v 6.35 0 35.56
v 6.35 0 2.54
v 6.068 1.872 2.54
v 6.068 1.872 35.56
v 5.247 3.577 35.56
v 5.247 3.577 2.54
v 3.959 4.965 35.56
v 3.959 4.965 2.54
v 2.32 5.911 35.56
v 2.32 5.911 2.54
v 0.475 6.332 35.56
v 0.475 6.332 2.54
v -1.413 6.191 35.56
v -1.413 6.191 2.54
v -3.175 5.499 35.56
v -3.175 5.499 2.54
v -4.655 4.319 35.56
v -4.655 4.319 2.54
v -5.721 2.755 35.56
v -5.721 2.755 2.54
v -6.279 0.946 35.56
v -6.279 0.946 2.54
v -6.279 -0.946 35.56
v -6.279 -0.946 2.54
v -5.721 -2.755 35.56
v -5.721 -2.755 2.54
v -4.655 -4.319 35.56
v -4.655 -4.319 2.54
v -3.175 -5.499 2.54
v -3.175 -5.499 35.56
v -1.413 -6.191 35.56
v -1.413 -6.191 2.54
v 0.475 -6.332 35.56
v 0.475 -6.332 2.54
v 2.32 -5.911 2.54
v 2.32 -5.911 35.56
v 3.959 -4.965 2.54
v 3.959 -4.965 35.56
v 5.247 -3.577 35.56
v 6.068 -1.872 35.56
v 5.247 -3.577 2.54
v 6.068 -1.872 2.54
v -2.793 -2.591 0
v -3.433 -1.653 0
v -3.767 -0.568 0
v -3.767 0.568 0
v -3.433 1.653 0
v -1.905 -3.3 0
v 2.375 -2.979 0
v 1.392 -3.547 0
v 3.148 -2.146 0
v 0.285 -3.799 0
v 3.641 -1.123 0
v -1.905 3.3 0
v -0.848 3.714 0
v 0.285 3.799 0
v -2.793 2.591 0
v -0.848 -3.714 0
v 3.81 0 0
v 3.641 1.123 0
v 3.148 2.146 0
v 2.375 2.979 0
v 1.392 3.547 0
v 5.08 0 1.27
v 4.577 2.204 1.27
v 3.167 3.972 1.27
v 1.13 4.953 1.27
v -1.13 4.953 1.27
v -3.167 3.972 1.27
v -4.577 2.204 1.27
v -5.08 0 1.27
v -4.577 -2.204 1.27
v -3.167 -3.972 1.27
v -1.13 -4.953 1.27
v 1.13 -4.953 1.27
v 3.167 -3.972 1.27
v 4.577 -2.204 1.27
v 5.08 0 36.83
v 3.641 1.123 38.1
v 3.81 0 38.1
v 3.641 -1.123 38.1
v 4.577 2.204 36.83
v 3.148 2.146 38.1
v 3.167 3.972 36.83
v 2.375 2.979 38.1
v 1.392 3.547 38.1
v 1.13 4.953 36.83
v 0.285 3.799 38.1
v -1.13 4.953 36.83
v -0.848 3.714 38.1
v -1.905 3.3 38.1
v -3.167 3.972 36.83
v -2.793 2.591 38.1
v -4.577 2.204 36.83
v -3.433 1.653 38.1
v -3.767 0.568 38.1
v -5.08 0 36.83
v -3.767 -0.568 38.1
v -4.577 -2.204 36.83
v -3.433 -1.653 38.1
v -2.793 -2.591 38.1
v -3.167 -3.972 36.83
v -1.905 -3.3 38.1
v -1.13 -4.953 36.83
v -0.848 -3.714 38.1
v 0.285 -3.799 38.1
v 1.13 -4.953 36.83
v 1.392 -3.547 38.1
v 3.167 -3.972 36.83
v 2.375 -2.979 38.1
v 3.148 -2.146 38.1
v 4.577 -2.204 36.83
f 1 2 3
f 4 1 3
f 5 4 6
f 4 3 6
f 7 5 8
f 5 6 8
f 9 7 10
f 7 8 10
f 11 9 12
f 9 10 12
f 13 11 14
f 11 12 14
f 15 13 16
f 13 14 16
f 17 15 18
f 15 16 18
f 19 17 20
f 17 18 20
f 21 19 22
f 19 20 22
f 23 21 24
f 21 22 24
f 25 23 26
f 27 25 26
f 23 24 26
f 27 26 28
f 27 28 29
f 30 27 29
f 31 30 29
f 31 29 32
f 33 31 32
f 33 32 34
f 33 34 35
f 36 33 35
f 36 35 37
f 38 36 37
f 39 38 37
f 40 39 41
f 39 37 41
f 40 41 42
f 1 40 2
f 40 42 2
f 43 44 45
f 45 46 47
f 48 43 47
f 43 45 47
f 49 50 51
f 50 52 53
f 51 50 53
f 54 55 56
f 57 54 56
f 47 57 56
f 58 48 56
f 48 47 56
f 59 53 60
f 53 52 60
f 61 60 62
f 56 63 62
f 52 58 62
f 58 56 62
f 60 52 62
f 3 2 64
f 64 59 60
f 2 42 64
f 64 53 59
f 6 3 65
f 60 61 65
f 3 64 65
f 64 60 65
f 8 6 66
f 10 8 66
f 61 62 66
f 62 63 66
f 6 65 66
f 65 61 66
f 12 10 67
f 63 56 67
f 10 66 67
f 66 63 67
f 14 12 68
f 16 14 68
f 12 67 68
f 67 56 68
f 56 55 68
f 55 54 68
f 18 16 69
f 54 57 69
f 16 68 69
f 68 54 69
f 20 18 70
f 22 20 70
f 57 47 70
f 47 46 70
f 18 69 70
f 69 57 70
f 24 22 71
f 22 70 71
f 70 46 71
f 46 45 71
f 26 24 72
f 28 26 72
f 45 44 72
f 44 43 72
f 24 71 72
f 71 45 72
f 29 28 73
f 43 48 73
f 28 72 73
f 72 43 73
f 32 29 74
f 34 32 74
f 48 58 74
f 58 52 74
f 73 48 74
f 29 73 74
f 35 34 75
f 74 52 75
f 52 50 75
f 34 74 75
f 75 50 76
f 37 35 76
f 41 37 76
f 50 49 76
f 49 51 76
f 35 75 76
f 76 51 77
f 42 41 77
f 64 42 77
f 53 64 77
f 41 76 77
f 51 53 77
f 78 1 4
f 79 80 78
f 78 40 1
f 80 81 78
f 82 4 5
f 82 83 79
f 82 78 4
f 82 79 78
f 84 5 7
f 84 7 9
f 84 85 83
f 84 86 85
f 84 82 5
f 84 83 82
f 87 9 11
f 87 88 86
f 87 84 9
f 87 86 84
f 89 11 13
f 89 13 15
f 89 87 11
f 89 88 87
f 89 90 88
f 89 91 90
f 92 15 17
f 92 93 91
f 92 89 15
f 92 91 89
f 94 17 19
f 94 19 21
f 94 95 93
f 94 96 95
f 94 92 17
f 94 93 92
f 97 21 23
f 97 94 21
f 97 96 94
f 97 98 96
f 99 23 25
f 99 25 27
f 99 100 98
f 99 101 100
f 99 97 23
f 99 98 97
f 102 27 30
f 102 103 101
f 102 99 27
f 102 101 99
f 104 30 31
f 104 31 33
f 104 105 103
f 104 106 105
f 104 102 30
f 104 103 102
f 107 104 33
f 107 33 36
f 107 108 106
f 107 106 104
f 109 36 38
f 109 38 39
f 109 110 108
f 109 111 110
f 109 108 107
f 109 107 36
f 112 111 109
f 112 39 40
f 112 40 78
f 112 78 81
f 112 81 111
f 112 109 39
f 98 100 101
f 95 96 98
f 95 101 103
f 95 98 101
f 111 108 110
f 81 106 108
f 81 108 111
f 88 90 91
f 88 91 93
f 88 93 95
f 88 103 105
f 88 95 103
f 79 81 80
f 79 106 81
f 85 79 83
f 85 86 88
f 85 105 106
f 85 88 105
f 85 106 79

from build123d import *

# Parameters (mm, degrees)
SKETCH1_R           = 6.35
BOSS_EXTRUDE1_DEPTH = 38.1
CHAMFER1_SIZE       = 2.54
CHAMFER2_SIZE       = 2.54


with BuildPart() as part:
    # Sketch1 → Boss-Extrude1 (new body)
    with BuildSketch(Plane.XY):
        Circle(SKETCH1_R)
    extrude(amount=BOSS_EXTRUDE1_DEPTH)

    # Chamfer1
    chamfer1_edges = [part.edges().sort_by_distance(p)[0] for p in [
        (-6.35, 0, 38.1),
    ]]
    chamfer(chamfer1_edges, length=CHAMFER1_SIZE)

    # Chamfer2
    chamfer2_edges = [part.edges().sort_by_distance(p)[0] for p in [
        (-6.35, 0, 0),
    ]]
    chamfer(chamfer2_edges, length=CHAMFER2_SIZE)


solid = part.part
